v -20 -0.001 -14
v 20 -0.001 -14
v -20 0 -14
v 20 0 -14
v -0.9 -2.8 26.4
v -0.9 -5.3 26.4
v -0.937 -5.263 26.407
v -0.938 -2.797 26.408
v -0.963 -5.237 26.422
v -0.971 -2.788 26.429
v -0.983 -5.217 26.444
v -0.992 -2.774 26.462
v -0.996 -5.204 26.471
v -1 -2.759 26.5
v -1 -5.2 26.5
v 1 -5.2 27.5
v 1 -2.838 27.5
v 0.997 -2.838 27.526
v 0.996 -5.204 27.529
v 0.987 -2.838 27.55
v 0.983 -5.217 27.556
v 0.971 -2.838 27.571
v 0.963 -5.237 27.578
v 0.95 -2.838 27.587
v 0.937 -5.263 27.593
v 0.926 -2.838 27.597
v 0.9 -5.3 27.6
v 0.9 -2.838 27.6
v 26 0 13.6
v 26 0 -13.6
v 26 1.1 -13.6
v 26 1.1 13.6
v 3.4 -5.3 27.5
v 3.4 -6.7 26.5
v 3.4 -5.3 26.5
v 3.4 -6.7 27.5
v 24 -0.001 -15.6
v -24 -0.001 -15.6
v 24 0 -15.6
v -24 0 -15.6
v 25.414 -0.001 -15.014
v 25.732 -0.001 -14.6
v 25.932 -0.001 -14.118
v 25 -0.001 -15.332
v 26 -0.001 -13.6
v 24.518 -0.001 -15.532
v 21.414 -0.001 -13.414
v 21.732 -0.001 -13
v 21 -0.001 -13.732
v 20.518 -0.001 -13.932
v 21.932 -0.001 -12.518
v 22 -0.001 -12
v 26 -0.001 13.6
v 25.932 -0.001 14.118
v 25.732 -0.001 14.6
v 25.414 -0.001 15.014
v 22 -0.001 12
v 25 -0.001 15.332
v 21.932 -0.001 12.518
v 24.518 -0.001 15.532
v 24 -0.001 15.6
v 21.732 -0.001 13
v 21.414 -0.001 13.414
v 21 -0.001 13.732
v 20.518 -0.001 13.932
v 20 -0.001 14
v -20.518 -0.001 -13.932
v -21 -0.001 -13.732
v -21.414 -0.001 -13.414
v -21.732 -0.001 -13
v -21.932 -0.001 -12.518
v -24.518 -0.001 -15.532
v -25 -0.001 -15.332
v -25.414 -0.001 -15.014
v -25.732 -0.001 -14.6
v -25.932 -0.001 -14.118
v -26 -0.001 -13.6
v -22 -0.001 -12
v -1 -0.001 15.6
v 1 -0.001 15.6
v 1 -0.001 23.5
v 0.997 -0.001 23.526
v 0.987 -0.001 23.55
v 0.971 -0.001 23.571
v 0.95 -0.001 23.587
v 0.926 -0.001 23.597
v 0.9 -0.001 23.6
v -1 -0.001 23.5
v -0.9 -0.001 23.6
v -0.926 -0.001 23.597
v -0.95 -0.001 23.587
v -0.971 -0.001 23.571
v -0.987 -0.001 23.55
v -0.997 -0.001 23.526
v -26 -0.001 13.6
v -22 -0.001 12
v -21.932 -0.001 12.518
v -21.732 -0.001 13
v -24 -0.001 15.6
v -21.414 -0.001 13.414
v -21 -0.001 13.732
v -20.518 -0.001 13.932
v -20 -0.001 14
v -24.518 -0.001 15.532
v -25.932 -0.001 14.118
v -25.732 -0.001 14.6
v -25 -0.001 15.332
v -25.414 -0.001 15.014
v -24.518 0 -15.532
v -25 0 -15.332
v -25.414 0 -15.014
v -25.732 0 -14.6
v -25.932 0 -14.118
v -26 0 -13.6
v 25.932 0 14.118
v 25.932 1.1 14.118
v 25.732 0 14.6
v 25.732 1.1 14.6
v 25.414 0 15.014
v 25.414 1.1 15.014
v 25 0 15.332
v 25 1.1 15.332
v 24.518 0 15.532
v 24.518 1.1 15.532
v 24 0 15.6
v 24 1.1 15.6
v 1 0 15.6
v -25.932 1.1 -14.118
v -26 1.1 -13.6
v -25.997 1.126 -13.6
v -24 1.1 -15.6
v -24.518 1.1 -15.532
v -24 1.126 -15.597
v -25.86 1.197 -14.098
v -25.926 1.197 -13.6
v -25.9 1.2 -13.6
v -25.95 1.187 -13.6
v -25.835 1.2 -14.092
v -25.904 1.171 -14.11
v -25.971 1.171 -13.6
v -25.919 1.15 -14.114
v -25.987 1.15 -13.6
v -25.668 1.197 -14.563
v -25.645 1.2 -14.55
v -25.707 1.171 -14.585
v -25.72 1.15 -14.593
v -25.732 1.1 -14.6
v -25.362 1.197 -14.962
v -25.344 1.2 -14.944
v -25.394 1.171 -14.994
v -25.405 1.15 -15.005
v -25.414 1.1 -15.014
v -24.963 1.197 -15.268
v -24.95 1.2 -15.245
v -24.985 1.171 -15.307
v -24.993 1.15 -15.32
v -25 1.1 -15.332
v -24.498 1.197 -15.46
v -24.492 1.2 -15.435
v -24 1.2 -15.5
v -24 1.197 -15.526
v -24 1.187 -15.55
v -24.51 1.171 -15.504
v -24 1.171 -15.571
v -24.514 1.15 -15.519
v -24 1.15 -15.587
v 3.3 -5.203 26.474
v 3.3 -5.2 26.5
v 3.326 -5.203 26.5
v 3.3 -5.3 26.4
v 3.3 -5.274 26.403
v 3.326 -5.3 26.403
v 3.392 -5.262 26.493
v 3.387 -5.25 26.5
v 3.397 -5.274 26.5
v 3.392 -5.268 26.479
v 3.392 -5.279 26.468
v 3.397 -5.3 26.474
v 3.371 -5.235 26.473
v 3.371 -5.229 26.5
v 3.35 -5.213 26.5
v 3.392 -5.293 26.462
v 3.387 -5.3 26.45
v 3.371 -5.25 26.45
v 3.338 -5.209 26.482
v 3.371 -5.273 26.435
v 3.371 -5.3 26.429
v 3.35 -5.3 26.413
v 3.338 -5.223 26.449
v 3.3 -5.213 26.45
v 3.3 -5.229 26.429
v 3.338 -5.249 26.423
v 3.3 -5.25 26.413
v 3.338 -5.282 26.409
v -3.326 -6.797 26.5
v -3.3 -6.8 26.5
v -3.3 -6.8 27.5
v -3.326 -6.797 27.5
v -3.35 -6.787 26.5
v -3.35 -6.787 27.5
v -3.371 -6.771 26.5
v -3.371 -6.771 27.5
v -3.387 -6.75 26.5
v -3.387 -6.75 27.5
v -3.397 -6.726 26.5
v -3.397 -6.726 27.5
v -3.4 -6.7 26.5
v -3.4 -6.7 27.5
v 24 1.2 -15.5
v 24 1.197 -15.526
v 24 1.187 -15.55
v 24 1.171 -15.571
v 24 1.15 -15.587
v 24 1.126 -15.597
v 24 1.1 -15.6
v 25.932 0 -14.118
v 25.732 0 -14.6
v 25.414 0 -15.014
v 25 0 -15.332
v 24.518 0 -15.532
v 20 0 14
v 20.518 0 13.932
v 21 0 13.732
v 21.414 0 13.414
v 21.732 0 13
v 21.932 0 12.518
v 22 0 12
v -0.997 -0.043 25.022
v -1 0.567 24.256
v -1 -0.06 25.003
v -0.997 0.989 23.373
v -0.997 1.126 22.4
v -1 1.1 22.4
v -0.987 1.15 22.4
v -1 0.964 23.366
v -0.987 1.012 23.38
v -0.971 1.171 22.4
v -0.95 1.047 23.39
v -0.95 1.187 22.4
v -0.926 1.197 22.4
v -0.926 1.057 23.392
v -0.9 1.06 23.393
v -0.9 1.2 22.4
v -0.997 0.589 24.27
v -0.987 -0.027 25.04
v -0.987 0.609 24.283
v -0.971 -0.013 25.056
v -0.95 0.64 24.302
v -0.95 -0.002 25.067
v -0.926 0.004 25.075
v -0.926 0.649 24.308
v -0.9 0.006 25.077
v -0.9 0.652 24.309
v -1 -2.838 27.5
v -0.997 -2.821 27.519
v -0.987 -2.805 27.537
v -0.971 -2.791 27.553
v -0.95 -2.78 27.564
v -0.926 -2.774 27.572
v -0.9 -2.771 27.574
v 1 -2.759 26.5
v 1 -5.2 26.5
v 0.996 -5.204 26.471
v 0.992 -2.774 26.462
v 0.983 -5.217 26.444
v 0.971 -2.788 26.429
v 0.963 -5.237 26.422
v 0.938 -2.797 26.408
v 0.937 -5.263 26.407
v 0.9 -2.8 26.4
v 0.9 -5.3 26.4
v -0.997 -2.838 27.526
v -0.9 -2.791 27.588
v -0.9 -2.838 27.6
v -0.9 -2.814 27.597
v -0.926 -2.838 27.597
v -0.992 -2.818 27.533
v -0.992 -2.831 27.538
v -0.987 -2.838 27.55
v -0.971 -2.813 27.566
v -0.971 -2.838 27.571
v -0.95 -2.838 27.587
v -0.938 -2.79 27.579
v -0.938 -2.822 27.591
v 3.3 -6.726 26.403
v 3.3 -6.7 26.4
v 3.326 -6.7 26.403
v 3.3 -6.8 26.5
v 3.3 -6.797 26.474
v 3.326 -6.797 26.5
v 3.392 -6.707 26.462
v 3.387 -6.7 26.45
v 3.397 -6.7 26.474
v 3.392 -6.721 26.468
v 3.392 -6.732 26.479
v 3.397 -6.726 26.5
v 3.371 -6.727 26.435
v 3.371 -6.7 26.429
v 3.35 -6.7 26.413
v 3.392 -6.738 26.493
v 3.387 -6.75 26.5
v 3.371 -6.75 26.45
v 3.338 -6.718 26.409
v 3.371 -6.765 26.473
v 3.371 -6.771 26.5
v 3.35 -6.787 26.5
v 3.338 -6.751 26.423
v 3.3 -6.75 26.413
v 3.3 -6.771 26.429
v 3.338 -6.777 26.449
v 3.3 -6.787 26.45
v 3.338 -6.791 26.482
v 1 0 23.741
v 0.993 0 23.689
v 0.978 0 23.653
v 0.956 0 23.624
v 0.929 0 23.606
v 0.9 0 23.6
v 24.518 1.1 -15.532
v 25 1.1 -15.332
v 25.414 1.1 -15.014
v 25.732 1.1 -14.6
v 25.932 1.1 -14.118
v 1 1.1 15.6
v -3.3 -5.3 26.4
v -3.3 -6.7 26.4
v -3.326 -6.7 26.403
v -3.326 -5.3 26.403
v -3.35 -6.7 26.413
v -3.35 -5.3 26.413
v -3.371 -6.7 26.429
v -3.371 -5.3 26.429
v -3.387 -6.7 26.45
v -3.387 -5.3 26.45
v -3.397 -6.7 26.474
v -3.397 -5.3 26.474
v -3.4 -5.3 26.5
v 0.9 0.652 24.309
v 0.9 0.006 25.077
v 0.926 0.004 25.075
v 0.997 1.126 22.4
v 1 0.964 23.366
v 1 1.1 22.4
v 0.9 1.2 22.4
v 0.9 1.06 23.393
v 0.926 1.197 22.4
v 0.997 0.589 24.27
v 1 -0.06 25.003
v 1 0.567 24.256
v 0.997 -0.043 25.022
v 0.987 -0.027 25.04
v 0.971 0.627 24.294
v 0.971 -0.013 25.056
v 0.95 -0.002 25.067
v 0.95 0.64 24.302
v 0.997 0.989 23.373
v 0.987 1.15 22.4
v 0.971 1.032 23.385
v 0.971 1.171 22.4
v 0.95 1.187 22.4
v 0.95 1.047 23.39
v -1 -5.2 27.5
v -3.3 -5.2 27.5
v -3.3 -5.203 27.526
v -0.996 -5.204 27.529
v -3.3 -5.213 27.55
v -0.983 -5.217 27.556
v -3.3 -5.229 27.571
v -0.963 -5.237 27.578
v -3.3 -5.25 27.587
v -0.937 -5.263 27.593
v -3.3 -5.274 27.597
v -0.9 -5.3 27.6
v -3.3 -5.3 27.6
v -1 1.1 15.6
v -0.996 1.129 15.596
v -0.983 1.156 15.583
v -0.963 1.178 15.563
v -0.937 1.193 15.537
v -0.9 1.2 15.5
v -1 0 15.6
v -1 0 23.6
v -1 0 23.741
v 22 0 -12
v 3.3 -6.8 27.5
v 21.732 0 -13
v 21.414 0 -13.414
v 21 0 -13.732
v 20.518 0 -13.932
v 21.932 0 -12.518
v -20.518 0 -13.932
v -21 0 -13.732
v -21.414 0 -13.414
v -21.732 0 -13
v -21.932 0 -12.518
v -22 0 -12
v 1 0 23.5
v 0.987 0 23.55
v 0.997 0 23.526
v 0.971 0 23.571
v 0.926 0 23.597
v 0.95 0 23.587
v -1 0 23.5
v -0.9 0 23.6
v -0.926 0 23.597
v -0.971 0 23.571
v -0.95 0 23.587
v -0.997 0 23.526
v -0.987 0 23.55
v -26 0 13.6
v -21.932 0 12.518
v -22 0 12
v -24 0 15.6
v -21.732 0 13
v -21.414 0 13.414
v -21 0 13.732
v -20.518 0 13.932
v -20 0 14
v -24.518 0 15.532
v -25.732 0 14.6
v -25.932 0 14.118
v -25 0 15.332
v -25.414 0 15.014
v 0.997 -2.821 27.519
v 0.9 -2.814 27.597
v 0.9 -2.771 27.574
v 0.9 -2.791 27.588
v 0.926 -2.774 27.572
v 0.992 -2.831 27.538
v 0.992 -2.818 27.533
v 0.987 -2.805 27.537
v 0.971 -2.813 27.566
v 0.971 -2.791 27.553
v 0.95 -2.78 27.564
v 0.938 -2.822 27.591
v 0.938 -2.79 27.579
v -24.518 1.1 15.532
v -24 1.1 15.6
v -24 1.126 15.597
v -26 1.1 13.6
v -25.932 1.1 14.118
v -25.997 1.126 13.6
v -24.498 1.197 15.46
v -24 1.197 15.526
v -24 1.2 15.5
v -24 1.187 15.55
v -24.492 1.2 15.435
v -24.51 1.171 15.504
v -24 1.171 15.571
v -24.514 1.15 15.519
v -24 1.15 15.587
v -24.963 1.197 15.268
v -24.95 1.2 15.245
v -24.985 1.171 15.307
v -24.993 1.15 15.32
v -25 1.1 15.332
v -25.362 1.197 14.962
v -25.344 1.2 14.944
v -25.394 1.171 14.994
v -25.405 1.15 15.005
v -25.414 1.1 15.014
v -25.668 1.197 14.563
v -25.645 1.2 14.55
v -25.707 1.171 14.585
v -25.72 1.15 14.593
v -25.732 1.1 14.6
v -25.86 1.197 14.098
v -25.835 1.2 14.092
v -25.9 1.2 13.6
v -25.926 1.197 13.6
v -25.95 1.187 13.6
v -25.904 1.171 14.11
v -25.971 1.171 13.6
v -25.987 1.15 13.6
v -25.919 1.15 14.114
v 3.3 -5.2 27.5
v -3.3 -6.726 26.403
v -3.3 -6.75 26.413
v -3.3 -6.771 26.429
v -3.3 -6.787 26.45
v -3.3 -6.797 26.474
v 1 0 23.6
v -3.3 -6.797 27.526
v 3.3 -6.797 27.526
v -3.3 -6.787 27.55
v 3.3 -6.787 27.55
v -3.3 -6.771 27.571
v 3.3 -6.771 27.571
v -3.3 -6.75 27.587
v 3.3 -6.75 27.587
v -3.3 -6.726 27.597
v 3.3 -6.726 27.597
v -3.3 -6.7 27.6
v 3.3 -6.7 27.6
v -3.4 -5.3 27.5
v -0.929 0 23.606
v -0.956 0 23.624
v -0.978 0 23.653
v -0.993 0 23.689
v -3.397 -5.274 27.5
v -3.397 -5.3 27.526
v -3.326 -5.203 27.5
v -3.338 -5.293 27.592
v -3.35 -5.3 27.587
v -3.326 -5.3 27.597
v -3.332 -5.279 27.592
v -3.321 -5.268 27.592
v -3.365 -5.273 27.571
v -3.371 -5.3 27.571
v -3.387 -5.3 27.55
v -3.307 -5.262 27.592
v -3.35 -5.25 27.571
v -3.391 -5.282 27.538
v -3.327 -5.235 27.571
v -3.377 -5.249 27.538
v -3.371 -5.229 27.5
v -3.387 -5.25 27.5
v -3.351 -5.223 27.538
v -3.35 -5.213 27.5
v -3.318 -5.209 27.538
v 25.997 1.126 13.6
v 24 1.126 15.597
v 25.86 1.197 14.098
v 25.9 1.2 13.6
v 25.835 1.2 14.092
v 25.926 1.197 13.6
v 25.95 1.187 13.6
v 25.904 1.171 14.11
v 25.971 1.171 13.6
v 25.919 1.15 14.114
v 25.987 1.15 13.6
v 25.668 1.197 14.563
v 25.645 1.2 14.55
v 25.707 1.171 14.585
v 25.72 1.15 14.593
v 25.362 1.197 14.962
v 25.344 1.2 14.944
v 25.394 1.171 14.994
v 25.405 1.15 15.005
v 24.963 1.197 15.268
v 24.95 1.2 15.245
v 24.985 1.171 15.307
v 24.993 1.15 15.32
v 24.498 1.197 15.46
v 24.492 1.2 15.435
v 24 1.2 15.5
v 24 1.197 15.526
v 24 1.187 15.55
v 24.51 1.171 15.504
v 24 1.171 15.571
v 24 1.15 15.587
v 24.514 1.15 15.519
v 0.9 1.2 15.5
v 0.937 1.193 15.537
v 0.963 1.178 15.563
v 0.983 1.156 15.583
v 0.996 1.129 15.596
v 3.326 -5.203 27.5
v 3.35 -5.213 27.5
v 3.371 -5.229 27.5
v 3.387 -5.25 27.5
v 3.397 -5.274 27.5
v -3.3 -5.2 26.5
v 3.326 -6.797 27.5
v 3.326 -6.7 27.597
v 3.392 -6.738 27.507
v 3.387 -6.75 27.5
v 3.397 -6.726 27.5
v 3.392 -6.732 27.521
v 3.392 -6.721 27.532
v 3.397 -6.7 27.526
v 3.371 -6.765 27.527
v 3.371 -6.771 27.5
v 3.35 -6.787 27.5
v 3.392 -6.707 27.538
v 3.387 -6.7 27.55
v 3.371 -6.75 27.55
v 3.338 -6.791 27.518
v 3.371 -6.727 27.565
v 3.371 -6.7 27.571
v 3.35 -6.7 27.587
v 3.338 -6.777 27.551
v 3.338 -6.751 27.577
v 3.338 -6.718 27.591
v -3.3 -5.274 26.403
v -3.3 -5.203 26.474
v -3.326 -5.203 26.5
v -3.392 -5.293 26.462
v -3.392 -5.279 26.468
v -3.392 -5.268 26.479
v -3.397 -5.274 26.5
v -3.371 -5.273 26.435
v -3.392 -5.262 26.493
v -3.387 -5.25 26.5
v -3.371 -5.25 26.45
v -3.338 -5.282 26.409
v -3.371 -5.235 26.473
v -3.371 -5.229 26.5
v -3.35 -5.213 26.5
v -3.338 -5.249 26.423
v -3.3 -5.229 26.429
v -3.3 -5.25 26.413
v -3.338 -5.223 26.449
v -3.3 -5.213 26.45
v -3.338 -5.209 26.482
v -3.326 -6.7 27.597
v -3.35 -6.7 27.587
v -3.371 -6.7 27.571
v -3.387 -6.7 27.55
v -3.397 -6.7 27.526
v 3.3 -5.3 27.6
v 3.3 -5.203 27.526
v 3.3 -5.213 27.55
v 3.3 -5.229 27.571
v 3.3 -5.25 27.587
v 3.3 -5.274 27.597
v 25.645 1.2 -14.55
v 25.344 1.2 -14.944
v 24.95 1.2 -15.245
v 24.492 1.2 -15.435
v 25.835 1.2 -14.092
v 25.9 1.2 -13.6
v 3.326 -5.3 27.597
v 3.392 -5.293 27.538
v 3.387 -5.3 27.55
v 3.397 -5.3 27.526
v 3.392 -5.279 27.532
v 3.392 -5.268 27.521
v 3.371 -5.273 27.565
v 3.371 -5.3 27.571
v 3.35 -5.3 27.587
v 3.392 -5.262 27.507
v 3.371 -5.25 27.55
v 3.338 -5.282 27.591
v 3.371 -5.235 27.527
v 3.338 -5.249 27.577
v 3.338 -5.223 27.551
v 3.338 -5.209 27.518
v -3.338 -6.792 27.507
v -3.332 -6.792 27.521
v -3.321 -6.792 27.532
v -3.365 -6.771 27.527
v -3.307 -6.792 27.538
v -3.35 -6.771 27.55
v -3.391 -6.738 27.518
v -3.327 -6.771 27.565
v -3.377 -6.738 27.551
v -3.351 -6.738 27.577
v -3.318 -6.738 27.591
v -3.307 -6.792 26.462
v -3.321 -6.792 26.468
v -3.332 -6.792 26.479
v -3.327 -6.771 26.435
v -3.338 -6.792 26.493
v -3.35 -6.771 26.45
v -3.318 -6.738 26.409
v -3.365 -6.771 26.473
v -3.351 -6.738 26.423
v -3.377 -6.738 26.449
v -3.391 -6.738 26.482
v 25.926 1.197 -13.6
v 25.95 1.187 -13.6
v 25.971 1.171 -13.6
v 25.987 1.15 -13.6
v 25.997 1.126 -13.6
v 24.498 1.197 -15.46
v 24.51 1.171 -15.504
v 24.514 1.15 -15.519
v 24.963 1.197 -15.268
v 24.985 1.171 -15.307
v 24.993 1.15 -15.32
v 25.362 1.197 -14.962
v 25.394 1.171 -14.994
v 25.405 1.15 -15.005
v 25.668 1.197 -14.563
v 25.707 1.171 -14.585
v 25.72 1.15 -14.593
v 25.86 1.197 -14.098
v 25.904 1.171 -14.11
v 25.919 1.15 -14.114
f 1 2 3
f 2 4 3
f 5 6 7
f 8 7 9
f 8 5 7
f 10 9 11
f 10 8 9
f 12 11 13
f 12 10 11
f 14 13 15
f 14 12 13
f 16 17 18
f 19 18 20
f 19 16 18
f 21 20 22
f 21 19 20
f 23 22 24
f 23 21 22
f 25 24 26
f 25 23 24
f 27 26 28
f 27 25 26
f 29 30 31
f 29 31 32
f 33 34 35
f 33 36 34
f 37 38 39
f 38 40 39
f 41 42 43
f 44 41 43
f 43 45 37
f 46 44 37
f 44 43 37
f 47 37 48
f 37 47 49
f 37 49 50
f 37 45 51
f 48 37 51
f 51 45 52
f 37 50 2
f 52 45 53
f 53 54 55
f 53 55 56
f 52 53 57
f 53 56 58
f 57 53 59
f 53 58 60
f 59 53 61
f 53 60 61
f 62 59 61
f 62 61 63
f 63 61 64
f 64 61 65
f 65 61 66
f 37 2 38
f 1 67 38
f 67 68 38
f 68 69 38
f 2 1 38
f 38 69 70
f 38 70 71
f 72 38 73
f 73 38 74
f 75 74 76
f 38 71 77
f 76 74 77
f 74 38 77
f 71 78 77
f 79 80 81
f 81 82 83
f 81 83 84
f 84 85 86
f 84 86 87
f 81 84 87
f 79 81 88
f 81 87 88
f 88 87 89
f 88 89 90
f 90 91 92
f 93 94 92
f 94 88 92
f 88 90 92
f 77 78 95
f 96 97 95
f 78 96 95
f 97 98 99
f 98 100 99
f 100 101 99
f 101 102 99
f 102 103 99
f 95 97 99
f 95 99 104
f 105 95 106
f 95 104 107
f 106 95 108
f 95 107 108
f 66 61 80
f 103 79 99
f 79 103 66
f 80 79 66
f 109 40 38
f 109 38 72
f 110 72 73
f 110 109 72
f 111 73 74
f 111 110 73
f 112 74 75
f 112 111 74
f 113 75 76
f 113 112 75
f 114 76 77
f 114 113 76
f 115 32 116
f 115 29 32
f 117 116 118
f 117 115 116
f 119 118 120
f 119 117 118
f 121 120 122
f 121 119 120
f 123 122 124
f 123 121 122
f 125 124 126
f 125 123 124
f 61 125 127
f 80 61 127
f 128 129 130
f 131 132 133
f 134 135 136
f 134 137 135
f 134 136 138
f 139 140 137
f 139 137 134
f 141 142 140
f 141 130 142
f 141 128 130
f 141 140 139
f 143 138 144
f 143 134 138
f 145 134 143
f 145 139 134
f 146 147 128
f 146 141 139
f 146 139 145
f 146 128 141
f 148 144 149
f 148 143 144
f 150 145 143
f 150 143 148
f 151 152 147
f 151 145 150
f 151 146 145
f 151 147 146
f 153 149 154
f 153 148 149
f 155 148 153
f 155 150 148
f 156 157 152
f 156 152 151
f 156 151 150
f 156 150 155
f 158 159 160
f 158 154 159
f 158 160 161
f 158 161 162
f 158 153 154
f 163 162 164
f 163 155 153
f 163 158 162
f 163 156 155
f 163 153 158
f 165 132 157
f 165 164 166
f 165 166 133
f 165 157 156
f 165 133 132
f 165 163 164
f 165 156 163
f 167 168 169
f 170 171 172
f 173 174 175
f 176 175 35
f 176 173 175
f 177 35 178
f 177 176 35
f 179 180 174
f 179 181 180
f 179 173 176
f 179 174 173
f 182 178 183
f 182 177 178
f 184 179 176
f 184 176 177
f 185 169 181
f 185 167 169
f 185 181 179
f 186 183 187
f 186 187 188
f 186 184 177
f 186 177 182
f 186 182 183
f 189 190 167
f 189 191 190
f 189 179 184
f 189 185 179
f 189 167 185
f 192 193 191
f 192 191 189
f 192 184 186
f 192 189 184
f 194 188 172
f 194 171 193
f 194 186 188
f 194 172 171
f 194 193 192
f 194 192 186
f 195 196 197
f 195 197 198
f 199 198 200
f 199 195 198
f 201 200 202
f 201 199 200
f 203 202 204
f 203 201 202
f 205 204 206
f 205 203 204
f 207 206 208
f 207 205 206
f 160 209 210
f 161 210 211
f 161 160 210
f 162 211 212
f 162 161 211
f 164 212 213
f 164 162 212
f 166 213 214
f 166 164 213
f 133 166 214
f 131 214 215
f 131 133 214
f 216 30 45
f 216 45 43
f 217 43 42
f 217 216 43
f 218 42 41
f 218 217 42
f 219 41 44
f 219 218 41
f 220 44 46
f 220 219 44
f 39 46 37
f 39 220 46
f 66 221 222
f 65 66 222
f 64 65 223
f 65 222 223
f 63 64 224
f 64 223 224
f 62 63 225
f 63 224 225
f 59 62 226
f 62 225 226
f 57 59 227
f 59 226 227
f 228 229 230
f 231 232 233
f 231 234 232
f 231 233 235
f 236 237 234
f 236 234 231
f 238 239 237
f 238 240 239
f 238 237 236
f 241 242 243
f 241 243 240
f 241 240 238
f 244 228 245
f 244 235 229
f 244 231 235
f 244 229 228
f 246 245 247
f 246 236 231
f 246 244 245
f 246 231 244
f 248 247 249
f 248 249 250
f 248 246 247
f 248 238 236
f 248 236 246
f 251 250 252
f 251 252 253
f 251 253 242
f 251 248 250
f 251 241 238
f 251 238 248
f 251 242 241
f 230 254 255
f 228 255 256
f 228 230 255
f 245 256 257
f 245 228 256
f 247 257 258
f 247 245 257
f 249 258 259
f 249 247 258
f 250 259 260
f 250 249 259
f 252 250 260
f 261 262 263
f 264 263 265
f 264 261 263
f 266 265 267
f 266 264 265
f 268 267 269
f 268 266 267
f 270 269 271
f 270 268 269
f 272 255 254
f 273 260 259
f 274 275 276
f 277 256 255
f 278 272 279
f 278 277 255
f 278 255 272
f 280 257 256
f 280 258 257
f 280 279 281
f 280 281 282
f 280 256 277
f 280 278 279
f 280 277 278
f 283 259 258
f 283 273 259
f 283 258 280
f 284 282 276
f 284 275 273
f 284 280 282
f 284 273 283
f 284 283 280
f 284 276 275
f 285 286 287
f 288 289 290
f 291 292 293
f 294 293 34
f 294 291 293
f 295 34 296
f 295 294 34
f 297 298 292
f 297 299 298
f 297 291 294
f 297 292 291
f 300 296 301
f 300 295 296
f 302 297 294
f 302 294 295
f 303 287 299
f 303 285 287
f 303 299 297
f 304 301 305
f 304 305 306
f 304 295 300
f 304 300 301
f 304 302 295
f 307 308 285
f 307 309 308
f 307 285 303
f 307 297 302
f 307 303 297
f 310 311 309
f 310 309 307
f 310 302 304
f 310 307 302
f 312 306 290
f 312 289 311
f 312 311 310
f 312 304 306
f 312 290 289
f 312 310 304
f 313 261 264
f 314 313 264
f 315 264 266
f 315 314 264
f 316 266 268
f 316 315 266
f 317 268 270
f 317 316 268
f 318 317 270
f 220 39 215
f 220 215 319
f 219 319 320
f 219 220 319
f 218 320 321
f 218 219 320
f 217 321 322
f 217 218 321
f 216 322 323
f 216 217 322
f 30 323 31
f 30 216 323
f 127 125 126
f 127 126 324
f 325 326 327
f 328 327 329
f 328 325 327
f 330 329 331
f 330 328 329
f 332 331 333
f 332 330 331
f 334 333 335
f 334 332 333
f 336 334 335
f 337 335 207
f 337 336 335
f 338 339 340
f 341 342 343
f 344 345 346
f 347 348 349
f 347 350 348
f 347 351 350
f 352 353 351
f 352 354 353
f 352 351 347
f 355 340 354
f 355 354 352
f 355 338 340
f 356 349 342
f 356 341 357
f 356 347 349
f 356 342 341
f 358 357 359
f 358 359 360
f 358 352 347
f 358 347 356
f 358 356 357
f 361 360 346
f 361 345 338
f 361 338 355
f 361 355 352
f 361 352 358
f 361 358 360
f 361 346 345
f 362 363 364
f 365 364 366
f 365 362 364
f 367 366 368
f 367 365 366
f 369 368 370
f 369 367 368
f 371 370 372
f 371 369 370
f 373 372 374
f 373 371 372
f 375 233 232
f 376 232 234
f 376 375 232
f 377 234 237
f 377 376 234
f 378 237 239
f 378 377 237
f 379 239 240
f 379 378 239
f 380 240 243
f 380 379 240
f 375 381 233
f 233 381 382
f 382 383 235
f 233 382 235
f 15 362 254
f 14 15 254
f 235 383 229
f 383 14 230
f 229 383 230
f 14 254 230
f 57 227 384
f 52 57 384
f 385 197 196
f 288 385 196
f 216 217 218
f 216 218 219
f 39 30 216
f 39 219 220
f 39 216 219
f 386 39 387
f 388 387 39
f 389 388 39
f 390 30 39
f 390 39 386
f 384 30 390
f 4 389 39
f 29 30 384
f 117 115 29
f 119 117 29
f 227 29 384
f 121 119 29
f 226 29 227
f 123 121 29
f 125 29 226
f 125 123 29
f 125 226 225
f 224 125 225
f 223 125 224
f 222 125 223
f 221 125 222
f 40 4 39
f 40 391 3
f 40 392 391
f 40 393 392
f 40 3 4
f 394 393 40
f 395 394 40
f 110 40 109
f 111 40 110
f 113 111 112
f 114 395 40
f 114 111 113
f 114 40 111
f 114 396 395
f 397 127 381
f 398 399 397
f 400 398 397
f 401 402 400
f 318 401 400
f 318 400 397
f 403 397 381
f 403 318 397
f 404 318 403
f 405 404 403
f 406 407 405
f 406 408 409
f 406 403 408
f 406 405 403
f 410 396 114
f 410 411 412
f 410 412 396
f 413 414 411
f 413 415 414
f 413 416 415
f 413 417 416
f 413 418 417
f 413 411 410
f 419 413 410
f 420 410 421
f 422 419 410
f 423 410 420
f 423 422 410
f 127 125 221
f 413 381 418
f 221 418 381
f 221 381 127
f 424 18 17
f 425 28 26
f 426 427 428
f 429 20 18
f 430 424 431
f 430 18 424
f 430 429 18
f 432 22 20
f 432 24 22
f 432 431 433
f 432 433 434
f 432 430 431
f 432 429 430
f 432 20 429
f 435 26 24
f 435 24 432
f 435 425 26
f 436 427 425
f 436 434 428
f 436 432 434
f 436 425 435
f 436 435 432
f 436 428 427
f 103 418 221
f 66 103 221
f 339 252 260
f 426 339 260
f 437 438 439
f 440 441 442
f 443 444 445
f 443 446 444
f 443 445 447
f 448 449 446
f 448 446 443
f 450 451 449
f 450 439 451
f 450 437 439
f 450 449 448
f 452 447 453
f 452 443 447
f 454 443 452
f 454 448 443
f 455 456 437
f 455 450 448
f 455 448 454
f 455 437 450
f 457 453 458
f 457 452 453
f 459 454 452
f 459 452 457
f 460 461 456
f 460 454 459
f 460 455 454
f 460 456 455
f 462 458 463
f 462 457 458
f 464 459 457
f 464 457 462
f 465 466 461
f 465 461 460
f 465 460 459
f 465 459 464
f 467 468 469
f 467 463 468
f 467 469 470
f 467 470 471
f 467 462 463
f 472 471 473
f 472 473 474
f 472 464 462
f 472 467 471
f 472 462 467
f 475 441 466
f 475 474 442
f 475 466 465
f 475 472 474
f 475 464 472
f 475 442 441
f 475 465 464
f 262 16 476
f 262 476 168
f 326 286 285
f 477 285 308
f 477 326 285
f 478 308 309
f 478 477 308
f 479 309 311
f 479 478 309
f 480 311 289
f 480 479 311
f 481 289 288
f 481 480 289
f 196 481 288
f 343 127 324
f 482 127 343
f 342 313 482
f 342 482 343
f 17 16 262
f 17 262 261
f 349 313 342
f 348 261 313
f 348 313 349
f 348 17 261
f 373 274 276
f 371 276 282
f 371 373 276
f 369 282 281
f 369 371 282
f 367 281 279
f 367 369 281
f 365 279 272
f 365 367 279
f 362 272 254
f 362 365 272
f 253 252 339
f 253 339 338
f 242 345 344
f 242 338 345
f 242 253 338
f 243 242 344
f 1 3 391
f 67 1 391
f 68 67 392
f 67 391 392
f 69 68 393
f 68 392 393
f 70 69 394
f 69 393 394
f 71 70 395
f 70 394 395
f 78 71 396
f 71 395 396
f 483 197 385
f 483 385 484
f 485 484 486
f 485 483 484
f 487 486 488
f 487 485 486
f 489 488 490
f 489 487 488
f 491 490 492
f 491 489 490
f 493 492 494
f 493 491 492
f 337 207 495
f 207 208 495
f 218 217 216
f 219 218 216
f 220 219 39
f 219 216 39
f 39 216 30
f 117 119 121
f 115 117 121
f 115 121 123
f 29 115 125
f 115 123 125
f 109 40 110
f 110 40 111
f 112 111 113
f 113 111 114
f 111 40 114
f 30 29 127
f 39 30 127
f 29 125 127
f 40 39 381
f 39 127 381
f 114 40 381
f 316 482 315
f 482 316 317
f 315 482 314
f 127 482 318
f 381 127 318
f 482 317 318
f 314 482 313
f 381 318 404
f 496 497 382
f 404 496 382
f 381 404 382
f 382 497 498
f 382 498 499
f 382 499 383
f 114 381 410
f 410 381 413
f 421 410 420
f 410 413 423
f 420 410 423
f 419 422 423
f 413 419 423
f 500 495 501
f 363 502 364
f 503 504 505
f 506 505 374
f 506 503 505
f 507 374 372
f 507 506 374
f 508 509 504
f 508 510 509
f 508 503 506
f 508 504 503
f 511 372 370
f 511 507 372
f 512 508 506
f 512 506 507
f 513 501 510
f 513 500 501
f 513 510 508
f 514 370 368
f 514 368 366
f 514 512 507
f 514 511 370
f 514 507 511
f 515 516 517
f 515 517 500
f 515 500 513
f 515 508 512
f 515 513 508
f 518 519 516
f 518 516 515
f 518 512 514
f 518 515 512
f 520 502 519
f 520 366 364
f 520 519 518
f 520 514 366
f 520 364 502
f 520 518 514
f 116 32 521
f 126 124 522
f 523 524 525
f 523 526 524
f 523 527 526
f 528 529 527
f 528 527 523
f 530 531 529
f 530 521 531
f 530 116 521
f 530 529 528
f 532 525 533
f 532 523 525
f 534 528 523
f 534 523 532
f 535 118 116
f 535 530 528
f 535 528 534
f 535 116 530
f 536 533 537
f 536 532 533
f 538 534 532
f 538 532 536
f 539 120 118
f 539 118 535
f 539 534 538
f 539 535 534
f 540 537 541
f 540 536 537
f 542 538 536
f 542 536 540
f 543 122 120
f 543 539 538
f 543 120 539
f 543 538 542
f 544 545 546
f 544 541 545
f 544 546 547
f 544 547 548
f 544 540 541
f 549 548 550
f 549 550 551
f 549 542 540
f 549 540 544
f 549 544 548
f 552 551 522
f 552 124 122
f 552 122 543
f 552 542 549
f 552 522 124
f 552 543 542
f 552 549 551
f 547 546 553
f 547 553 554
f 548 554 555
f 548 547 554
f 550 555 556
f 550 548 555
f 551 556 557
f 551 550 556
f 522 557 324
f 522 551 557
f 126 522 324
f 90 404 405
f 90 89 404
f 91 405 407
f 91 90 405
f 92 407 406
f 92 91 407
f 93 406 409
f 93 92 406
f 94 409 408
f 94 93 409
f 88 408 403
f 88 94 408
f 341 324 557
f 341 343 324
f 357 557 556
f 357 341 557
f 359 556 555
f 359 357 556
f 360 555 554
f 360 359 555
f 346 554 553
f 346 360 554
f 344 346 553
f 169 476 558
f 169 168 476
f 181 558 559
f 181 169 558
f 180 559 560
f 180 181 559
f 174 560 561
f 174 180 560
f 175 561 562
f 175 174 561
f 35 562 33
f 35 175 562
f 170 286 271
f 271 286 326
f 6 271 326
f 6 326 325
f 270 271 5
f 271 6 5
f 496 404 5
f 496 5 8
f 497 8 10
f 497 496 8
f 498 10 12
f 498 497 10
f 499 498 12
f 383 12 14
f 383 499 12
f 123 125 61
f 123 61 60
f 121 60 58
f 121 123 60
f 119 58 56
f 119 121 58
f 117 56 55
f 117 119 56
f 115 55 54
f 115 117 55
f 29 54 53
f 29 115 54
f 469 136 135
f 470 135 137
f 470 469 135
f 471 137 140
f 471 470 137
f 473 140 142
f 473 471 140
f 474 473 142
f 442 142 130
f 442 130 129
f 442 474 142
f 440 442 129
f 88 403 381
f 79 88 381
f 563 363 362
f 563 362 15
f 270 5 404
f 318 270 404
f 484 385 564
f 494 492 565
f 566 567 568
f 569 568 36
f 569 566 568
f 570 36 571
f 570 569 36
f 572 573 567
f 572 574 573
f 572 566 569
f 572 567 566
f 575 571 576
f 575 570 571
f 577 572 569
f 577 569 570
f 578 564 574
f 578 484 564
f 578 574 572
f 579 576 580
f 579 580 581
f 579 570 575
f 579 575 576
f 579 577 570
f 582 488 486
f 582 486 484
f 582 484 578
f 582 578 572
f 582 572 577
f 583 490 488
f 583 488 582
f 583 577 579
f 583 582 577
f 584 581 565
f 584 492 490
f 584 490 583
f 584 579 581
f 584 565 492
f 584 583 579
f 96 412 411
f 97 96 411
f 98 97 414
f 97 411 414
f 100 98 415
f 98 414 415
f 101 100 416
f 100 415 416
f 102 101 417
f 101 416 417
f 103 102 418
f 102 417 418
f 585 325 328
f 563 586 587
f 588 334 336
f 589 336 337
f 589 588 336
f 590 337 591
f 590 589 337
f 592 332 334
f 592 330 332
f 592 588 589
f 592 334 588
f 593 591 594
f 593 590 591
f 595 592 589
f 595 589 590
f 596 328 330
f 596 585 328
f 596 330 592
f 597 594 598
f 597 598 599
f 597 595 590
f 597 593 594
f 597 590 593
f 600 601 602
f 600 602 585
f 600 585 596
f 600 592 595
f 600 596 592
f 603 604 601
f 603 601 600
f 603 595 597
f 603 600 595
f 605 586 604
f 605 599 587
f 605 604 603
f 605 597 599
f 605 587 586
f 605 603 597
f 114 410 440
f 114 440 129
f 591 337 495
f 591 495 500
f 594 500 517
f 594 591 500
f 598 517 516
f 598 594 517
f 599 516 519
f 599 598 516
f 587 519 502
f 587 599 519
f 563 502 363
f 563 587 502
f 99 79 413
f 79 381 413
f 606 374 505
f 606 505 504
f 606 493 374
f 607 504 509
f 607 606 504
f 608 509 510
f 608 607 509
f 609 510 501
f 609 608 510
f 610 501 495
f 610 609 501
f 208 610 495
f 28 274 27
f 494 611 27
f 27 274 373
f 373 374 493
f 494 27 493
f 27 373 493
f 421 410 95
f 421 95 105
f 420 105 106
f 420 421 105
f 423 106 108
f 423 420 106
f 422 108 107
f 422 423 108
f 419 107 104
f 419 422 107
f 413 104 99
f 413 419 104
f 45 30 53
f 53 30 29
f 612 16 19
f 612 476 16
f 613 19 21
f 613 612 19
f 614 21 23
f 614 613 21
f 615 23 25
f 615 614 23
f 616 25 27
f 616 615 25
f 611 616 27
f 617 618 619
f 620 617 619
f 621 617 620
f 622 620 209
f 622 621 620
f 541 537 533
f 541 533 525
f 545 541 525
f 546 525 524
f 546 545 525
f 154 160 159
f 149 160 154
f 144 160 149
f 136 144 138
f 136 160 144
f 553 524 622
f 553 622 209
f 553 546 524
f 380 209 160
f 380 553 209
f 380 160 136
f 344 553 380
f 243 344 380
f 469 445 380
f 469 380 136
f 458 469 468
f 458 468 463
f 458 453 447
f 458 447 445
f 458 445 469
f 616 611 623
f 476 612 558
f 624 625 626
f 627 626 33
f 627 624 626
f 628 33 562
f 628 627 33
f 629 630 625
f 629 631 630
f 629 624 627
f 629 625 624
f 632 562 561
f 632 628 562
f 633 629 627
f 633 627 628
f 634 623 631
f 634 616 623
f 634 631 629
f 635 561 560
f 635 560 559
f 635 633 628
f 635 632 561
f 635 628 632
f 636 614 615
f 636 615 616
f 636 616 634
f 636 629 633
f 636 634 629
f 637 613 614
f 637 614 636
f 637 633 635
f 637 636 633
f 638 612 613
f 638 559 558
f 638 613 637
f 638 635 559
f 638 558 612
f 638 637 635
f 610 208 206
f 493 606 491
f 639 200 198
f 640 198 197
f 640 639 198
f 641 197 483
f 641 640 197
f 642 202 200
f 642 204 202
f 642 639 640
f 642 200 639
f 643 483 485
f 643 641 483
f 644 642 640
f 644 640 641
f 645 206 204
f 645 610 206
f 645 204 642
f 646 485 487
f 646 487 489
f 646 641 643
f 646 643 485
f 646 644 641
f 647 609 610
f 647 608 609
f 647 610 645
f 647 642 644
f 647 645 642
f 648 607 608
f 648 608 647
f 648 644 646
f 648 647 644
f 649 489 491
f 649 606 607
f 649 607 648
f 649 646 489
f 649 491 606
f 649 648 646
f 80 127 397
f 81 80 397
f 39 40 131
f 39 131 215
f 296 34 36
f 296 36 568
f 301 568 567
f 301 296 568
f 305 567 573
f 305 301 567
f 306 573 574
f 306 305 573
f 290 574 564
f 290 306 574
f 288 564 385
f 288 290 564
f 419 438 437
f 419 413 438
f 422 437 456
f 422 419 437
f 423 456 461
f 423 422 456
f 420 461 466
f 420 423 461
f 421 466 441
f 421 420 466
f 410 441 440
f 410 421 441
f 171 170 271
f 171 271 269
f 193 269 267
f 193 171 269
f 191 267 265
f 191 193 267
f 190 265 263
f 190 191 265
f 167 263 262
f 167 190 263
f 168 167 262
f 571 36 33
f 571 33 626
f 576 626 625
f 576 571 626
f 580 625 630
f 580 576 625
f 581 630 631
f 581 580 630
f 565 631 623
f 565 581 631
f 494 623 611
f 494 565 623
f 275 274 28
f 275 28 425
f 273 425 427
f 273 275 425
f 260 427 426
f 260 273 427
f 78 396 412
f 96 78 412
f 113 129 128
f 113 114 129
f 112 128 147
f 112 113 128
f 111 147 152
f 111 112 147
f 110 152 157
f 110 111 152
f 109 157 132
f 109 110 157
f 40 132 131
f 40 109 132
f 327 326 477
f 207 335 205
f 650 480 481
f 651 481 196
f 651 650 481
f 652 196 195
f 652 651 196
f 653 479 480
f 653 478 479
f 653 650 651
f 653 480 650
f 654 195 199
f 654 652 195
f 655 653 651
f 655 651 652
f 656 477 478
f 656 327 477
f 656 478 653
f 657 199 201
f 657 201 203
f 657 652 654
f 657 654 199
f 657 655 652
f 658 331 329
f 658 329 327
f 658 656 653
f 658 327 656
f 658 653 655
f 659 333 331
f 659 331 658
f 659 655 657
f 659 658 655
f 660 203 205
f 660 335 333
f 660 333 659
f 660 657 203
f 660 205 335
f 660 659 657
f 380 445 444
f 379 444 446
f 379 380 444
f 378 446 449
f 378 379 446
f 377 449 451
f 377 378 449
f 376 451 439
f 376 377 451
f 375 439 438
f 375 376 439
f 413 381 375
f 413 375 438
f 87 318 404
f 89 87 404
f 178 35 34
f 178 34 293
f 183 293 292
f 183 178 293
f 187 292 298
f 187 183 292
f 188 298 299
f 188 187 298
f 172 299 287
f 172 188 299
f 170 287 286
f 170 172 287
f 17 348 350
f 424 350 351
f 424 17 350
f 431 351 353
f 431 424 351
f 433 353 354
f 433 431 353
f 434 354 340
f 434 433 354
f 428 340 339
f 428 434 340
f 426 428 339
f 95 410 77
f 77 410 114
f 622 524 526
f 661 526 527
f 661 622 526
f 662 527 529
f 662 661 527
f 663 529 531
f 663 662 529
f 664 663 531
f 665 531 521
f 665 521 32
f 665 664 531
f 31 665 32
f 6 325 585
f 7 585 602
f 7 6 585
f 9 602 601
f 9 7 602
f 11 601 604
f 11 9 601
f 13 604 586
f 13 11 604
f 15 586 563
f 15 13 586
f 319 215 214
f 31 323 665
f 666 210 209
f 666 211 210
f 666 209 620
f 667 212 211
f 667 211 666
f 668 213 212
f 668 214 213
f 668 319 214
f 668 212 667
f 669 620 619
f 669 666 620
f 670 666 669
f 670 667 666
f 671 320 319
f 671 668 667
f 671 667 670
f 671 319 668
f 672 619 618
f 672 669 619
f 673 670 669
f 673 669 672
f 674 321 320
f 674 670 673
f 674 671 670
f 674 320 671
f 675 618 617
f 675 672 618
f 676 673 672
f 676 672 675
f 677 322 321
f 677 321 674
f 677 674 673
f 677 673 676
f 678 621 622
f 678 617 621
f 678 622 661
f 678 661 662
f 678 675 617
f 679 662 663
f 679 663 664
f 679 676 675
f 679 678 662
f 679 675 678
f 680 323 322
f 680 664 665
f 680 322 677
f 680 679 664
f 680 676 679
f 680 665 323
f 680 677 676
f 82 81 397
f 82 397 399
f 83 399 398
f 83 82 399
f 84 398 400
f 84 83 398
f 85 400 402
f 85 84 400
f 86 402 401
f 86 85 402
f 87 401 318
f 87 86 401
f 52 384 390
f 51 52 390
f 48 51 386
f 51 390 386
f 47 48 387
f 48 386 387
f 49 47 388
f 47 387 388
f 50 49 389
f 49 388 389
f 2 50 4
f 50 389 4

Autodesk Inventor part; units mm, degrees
ref_plane "YZ Plane" through (0, 0, 0) normal (1, 0, 0) x (0, 1, 0)
ref_plane "XZ Plane" through (0, 0, 0) normal (0, 1, 0) x (-1, 0, 0)
ref_plane "XY Plane" through (0, 0, 0) normal (0, 0, 1) x (1, 0, 0)
sketch "Sketch2" plane through (0, 0, 0) normal (0, 1, 0) x (-1, 0, 0)
  line L0 (-24, 15.6) -> (24, 15.6)
  line L1 (26, 13.6) -> (26, -13.6)
  line L2 (24, -15.6) -> (-24, -15.6)
  line L3 (-26, -13.6) -> (-26, 13.6)
  arc A0 (-24, 15.6) -> (-26, 13.6) centre (-24, 13.6) ccw
  arc A1 (-26, -13.6) -> (-24, -15.6) centre (-24, -13.6) ccw
  arc A2 (24, -15.6) -> (26, -13.6) centre (24, -13.6) ccw
  arc A3 (26, 13.6) -> (24, 15.6) centre (24, 13.6) ccw
  line L4 (20, 14) -> (-20, 14)
  line L5 (-22, 12) -> (-22, -12)
  line L6 (-20, -14) -> (20, -14)
  line L7 (22, -12) -> (22, 12)
  arc A4 (22, 12) -> (20, 14) centre (20, 12) ccw
  arc A5 (-20, 14) -> (-22, 12) centre (-20, 12) ccw
  arc A6 (-22, -12) -> (-20, -14) centre (-20, -12) ccw
  arc A7 (20, -14) -> (22, -12) centre (20, -12) ccw
  line L8 (-1, 15.6) -> (-1, 23.6)
  line L9 (-1, 23.6) -> (1, 23.6)
  line L10 (1, 23.6) -> (1, 15.6)
  point P0 (0, 0)
  point P1 (26, -15.6)
  point P2 (-26, -15.6)
  point P3 (0, 15.6)
  point P4 (-26, 0)
  point P5 (0, 14)
  point P6 (-22, 0)
  point P7 (0, 23.6)
  dimension "d0" = 31.2
  dimension "d1" = 52
  dimension "d2" = 2
  dimension "d3" = 28
  dimension "d4" = 44
  dimension "d5" = 2
  dimension "d22" = 2
  dimension "d23" = 8
extrude "Extrusion1" add sketch "Sketch2" along normal blind 1.2 contours L0 A3 L1 A2 L2 A1 L3 A0 | A4 L7 A7 L6 A6 L5 A5 L4
sketch "Sketch3" plane through (0, 0, 0) normal (1, 0, 0) x (0, 1, 0)
  line L0 (0, 15.6) -> (1.2, 15.6) projected
  arc A0 (1.2, 22.4) -> (0.0065, 25.0774) centre (-2.4, 22.4) ccw
  line L1 (0.0065, 25.0774) -> (-2.8, 27.6)
  line L2 (-2.8, 27.6) -> (-5.2, 27.6)
  line L3 (-5.2, 27.6) -> (-5.2, 26.4)
  line L4 (-5.2, 26.4) -> (-2.8, 26.4)
  line L5 (-2.8, 26.4) -> (0, 23.6)
  line L6 (0, 23.6) -> (0, 15.6)
  line L7 (-5.2, 27.6) -> (-6.8, 27.6)
  line L8 (-6.8, 27.6) -> (-6.8, 26.4)
  line L9 (-6.8, 26.4) -> (-5.2, 26.4)
  line L10 (1.2, 22.4) -> (1.2, 15.6)
  point P0 (0, 0)
  dimension "d10" = 6.8
  dimension "d11" = 4
  dimension "d12" = 1.2
  dimension "d13" = 1.6
  dimension "d14" = 12
  dimension "d15" = 8
  dimension "d16" = 6.8
  dimension "d17" = 3.6
extrude "Extrusion3" add sketch "Sketch3" along normal mid plane 2 contours L6 L5 L4 L3 L2 L1 A0 L10 L0
extrude "Extrusion4" add sketch "Sketch3" along normal mid plane 6.8 contours L9 L8 L7 L3
extrude "Extrusion2" add sketch "Sketch2" against normal blind 0.001 separate body
fillet "Fillet1" radius 0.1 38 edges at (-25.4142, 1.2, 15.0142) (-26, 1.2, 0) (-25.4142, 1.2, -15.0142) (0, 1.2, -15.6) (25.4142, 1.2, -15.0142) (26, 1.2, 0) (25.4142, 1.2, 15.0142) (12.5, 1.2, 15.6) (-12.5, 1.2, 15.6) (-1, 1.2, 19) (-1, -1.3967, 26.3387) (-1, 0.8881, 23.8657) (1, -1.3967, 26.3387) (1, 1.2, 19) (1, 0.8881, 23.8657) (0, -2.8, 27.6) (1, -1.4, 25) (-1, -1.4, 25) (1, -4, 26.4) (1, -4, 27.6) (-1, -4, 27.6) (-1, -4, 26.4) (-2.2, -5.2, 26.4) (-3.4, -5.2, 27) (-2.2, -5.2, 27.6) (-3.4, -6, 27.6) (-3.4, -6, 26.4) (-3.4, -6.8, 27) (0, -6.8, 27.6) (0, -6.8, 26.4) (2.2, -5.2, 27.6) (2.2, -5.2, 26.4) (3.4, -5.2, 27) (3.4, -6, 26.4) (3.4, -6, 27.6) (3.4, -6.8, 27) (1, -0.0005, 23.6) (-1, -0.0005, 23.6)
equation "\"d23\" = lu"
equation "\"d13\" = wall"
equation "\"d15\" = lu"
equation "\"lu\" = 8"
equation "\"wall\" = 1.6"
properties part number "99148p01-TransClear" material "Polycarbonate"
